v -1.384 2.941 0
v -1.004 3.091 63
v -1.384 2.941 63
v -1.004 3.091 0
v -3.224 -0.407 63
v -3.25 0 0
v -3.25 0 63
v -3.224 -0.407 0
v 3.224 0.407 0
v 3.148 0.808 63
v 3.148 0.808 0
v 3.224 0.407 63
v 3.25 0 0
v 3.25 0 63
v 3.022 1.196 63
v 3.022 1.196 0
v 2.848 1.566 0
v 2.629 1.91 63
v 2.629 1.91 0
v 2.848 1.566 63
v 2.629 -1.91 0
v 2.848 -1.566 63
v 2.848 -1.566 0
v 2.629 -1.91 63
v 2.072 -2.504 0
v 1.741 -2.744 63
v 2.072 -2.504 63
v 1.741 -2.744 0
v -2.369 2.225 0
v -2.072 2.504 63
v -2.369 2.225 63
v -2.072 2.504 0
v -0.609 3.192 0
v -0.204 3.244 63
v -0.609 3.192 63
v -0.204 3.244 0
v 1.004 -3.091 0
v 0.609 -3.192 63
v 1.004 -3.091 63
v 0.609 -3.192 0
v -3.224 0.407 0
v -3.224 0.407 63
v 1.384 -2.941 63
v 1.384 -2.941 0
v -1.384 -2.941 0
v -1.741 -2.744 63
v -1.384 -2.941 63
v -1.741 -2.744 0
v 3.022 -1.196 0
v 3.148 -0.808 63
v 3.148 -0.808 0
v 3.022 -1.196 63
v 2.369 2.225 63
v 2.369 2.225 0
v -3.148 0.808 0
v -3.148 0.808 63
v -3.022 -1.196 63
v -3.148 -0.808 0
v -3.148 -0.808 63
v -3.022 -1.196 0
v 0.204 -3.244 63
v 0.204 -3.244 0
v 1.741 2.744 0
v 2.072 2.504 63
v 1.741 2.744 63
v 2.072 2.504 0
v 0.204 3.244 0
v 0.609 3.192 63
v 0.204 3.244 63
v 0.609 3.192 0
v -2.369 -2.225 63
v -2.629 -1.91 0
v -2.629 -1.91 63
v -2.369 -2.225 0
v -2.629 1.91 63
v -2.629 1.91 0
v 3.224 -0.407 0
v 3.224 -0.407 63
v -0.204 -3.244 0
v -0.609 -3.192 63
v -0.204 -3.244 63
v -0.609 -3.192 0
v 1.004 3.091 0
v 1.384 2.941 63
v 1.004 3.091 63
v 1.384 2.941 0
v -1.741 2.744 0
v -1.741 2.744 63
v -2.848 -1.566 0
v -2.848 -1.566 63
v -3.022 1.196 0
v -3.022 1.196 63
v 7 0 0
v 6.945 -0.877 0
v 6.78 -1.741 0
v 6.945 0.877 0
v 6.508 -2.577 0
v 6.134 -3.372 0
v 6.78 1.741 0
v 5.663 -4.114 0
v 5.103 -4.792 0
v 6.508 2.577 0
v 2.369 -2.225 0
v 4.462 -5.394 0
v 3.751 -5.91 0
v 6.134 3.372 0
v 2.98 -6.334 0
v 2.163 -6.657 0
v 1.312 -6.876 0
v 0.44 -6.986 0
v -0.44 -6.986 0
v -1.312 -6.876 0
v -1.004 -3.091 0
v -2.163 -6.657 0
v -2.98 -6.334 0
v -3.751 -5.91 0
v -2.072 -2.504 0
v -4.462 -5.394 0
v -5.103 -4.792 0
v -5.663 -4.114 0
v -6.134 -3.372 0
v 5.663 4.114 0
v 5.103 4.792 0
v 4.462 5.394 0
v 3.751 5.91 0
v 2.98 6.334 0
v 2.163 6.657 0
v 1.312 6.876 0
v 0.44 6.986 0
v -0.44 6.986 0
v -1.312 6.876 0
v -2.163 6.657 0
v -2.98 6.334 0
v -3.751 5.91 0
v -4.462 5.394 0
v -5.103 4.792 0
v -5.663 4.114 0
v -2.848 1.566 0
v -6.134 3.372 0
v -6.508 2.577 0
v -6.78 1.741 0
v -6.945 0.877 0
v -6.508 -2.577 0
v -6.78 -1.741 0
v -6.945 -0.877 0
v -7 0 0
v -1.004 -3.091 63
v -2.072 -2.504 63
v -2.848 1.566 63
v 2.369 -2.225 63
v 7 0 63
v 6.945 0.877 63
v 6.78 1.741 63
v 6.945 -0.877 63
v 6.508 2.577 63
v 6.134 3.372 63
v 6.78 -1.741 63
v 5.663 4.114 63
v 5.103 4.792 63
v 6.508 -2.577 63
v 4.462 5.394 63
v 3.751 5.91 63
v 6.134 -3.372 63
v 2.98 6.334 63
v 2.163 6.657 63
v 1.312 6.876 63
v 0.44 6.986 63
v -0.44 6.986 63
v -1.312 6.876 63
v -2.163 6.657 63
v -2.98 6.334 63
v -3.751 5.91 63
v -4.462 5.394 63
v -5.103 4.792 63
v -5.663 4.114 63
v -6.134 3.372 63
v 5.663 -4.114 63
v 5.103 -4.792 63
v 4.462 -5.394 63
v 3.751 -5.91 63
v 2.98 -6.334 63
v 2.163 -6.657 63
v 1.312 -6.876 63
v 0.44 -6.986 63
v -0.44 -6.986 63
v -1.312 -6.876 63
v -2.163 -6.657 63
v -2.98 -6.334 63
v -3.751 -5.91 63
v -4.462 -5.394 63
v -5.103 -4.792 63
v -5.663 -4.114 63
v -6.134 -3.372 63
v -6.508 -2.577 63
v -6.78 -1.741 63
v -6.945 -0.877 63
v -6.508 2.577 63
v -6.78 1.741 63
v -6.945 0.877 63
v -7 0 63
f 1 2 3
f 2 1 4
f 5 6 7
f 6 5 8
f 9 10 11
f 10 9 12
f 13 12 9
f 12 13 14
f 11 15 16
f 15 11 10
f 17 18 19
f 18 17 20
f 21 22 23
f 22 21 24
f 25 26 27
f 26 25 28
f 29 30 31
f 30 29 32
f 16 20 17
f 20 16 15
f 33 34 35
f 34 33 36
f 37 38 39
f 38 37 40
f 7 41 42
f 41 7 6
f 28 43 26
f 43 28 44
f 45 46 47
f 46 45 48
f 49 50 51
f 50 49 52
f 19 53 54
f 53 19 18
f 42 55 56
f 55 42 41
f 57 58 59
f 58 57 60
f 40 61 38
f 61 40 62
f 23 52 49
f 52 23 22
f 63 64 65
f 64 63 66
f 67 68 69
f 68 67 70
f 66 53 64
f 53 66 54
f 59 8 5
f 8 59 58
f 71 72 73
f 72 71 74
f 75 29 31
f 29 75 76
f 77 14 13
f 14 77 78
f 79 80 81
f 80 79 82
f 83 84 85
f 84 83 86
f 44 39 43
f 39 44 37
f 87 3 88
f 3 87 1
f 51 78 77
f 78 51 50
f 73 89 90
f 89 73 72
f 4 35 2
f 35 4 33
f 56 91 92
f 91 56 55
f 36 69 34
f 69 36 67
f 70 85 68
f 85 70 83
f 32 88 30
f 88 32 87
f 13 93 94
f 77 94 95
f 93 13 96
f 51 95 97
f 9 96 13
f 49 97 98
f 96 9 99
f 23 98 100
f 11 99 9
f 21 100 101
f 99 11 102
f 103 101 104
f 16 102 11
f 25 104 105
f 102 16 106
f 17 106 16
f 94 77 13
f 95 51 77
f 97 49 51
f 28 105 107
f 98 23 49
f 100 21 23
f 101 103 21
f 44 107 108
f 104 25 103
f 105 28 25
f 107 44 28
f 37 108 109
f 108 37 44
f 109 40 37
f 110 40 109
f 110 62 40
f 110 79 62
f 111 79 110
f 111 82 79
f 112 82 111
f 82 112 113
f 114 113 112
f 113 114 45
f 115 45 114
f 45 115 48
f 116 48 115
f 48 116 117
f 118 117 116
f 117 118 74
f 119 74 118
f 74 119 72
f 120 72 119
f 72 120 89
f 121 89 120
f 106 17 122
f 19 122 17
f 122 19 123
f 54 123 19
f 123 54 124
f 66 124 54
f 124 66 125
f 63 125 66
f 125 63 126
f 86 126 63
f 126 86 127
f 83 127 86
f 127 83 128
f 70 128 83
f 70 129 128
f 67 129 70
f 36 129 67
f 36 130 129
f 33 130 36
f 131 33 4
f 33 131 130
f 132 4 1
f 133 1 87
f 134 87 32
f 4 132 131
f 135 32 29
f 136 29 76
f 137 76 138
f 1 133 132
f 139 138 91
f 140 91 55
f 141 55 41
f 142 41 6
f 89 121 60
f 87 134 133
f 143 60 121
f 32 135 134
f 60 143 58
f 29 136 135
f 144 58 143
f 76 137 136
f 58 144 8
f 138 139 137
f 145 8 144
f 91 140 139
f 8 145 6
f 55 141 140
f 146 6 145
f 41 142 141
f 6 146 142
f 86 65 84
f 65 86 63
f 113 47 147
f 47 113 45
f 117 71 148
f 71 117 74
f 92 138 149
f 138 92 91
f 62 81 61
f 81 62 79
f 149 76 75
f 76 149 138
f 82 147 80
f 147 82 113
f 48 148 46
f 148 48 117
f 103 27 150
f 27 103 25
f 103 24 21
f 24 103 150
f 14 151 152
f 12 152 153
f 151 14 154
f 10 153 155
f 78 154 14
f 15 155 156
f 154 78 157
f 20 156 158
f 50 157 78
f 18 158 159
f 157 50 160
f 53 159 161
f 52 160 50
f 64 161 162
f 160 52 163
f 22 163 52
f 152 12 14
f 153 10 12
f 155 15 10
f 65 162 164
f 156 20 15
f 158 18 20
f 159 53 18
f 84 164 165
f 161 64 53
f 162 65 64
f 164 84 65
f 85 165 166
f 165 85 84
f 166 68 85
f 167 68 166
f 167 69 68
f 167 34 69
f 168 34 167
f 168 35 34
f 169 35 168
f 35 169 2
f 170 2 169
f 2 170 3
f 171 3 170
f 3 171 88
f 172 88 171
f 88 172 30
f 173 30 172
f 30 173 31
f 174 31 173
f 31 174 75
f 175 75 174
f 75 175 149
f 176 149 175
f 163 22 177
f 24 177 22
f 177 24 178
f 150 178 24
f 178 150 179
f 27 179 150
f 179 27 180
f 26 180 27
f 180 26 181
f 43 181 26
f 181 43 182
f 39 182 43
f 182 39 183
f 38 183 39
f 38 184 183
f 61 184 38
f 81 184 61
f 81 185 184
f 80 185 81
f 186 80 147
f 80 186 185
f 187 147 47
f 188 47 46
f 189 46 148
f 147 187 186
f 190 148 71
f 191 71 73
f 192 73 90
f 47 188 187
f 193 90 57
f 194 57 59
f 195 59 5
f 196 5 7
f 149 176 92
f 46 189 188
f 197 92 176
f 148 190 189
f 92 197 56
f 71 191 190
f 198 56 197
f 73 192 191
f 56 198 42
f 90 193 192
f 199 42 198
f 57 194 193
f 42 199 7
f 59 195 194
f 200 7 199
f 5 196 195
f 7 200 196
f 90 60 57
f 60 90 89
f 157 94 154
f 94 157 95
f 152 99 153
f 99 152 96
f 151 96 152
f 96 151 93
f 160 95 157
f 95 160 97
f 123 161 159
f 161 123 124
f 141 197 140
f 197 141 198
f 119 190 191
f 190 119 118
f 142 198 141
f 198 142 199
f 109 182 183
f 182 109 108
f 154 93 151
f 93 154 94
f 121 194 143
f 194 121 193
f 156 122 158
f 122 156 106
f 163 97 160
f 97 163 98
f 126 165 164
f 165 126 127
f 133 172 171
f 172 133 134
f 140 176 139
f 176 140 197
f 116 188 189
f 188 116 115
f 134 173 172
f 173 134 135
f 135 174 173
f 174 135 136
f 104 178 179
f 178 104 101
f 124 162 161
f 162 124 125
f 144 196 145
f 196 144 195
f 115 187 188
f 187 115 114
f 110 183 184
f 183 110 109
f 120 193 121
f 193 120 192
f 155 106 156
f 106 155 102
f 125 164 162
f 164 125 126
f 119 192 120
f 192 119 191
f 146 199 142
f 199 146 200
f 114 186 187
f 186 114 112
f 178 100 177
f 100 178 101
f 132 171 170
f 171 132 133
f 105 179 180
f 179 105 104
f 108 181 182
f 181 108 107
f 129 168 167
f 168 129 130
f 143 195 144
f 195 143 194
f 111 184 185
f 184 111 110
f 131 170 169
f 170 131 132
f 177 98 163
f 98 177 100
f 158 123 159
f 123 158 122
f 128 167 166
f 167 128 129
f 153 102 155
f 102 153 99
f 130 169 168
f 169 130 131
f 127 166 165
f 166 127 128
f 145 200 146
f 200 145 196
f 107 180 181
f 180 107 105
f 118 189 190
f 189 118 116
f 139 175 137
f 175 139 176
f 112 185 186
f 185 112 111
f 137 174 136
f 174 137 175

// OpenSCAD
$fn = 50;


difference() {
	union() {
		cylinder(h = 63, r = 7.0000000000);
	}
	union() {
		cylinder(h = 63, r = 3.2500000000);
		cylinder(h = 63, r = 3.2500000000);
		cylinder(h = 63, r = 1.8000000000);
		cylinder(h = 63, r = 1.8000000000);
		cylinder(h = 63, r = 1.8000000000);
		cylinder(h = 63, r = 1.8000000000);
		cylinder(h = 63, r = 1.8000000000);
		cylinder(h = 63, r = 1.8000000000);
	}
}
